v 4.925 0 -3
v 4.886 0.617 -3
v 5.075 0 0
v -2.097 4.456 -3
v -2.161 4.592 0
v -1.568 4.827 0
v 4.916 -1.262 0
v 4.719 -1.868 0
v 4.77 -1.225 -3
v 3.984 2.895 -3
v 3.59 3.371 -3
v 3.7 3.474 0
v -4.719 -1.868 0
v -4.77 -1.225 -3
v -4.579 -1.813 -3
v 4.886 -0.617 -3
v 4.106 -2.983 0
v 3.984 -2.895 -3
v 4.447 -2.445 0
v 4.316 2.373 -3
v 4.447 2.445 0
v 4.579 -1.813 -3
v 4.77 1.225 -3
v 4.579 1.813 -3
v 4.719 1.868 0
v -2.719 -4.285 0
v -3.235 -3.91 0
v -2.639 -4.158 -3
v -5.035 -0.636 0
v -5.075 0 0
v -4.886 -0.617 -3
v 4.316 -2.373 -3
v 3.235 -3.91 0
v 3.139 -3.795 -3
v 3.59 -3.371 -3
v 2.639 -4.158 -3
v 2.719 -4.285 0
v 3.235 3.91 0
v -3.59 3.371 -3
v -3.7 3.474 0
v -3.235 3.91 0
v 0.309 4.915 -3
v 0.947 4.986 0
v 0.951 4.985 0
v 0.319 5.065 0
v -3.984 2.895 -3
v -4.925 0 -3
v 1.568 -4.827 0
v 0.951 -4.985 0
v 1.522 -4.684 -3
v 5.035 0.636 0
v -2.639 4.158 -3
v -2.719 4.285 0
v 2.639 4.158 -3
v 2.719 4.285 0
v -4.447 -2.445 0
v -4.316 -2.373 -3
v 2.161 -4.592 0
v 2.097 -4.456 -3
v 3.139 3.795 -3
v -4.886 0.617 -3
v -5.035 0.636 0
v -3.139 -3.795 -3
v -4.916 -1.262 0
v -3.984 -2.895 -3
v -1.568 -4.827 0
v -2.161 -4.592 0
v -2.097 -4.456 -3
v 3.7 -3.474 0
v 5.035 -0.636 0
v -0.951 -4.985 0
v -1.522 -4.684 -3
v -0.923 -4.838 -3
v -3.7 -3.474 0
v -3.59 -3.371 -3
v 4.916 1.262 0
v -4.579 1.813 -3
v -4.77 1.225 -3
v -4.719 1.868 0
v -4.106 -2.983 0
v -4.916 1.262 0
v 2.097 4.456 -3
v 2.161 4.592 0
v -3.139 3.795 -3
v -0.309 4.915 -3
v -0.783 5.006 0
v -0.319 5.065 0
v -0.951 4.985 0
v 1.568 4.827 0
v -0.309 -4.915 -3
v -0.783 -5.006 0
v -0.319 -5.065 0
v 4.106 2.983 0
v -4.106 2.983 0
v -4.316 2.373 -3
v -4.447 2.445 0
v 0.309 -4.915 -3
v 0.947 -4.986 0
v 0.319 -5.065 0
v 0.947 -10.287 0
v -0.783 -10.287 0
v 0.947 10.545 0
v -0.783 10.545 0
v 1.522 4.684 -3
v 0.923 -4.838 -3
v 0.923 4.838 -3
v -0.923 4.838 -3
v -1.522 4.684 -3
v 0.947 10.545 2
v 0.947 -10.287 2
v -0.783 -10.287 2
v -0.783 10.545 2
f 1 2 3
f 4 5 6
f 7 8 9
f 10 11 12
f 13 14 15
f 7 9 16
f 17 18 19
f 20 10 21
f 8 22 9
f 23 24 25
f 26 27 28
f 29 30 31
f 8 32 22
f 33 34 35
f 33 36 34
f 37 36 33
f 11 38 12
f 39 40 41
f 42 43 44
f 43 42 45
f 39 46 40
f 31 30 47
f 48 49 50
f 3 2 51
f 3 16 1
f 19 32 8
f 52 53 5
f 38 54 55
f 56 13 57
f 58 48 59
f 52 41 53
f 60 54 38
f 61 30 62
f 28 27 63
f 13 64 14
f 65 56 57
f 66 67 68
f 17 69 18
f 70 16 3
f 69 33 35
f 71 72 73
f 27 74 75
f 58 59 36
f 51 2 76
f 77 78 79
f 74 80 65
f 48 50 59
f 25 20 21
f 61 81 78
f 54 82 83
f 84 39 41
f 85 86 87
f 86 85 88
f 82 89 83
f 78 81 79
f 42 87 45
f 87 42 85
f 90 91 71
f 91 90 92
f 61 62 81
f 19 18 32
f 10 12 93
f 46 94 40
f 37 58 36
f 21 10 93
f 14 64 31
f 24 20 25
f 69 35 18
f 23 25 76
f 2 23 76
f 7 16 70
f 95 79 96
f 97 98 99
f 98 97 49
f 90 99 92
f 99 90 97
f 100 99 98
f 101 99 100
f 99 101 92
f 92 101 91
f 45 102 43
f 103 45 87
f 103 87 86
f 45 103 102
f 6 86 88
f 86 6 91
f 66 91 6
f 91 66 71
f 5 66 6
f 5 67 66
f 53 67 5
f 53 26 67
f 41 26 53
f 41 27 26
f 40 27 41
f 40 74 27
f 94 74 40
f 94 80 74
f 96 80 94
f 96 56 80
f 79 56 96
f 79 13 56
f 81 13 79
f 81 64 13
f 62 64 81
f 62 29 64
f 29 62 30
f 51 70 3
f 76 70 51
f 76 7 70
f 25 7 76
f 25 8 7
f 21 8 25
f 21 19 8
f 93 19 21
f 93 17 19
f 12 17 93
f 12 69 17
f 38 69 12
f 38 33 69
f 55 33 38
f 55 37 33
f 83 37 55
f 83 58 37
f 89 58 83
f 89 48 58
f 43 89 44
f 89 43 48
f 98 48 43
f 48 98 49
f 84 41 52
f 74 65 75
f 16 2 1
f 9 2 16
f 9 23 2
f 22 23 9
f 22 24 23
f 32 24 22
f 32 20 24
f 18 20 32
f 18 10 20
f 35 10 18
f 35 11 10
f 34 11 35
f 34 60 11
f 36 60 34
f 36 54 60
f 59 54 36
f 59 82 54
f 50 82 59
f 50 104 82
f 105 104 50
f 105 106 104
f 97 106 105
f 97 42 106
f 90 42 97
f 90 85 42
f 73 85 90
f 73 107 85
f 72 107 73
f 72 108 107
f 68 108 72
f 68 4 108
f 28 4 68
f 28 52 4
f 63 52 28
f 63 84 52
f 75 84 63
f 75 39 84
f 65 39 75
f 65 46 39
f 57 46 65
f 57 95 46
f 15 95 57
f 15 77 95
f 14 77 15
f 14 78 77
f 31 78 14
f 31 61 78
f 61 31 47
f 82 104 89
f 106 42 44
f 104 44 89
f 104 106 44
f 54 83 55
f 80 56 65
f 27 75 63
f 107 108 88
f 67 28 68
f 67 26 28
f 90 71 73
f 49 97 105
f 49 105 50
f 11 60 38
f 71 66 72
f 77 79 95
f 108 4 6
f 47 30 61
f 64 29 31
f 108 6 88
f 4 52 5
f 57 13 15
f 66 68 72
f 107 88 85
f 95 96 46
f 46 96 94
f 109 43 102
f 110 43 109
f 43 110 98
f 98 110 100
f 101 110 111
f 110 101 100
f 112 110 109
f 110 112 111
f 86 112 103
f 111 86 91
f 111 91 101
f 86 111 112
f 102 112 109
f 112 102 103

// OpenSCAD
$fn = 50;

difference() {
	union() {
		translate(v = [0, 0, -3.0]) {
			cylinder(h = 3, r1 = 4.925, r2 = 5.075);
		}
		linear_extrude(height = 2) {
			text(font = "Wingdings", halign = "center", size = 15, text = "|", valign = "center");
		}
	}
	union();
}
